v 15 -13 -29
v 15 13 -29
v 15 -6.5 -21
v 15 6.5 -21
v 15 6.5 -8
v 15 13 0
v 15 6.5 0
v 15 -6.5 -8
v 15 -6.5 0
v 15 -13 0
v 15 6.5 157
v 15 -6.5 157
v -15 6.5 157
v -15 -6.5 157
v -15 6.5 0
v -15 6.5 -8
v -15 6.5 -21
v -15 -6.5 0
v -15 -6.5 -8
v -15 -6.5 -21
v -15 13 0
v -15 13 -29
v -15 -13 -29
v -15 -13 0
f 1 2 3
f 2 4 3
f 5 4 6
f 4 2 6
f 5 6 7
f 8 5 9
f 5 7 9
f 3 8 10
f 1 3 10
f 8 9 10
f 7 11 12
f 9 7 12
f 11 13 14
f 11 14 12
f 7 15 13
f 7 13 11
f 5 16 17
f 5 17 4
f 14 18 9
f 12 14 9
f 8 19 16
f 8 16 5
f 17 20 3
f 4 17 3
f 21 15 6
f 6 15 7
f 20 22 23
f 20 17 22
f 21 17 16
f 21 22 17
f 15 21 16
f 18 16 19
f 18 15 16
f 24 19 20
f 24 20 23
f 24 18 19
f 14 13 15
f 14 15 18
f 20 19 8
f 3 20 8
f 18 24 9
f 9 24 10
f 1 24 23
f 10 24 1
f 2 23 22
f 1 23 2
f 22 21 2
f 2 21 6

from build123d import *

# Parameters (mm, degrees)
F0_W     = 30
F0_H     = 13
F1_DEPTH = 157
F2_W     = 30
F2_H     = 26
F3_DEPTH = 8
F4_W     = 30
F4_H     = 6.5
F5_DEPTH = 13
F6_W     = 30
F6_H     = 26
F7_DEPTH = 8


with BuildPart() as f1:
    # F0 (on Top) → F1 (new body)
    with BuildSketch(Plane.XY):
        Rectangle(F0_W, F0_H)
    extrude(amount=F1_DEPTH)

    # F2 (on face) → F3 (join)
    with BuildSketch(Plane(origin=(0, 0, 0), x_dir=(1, 0, 0), z_dir=(0, 0, -1))):
        Rectangle(F2_W, F2_H)
    extrude(amount=F3_DEPTH)

    # F4 (on face) → F5 (join)
    with BuildSketch(Plane(origin=(0, 0, -8), x_dir=(1, 0, 0), z_dir=(0, 0, -1))):
        with Locations((0, -9.75)):
            Rectangle(F4_W, F4_H)
        with Locations((0, 9.75)):
            Rectangle(F4_W, F4_H)
    extrude(amount=F5_DEPTH)

    # F6 (on face) → F7 (join)
    with BuildSketch(Plane(origin=(0, 0, -21), x_dir=(1, 0, 0), z_dir=(0, 0, -1))):
        Rectangle(F6_W, F6_H)
    extrude(amount=F7_DEPTH)


solid = f1.part
